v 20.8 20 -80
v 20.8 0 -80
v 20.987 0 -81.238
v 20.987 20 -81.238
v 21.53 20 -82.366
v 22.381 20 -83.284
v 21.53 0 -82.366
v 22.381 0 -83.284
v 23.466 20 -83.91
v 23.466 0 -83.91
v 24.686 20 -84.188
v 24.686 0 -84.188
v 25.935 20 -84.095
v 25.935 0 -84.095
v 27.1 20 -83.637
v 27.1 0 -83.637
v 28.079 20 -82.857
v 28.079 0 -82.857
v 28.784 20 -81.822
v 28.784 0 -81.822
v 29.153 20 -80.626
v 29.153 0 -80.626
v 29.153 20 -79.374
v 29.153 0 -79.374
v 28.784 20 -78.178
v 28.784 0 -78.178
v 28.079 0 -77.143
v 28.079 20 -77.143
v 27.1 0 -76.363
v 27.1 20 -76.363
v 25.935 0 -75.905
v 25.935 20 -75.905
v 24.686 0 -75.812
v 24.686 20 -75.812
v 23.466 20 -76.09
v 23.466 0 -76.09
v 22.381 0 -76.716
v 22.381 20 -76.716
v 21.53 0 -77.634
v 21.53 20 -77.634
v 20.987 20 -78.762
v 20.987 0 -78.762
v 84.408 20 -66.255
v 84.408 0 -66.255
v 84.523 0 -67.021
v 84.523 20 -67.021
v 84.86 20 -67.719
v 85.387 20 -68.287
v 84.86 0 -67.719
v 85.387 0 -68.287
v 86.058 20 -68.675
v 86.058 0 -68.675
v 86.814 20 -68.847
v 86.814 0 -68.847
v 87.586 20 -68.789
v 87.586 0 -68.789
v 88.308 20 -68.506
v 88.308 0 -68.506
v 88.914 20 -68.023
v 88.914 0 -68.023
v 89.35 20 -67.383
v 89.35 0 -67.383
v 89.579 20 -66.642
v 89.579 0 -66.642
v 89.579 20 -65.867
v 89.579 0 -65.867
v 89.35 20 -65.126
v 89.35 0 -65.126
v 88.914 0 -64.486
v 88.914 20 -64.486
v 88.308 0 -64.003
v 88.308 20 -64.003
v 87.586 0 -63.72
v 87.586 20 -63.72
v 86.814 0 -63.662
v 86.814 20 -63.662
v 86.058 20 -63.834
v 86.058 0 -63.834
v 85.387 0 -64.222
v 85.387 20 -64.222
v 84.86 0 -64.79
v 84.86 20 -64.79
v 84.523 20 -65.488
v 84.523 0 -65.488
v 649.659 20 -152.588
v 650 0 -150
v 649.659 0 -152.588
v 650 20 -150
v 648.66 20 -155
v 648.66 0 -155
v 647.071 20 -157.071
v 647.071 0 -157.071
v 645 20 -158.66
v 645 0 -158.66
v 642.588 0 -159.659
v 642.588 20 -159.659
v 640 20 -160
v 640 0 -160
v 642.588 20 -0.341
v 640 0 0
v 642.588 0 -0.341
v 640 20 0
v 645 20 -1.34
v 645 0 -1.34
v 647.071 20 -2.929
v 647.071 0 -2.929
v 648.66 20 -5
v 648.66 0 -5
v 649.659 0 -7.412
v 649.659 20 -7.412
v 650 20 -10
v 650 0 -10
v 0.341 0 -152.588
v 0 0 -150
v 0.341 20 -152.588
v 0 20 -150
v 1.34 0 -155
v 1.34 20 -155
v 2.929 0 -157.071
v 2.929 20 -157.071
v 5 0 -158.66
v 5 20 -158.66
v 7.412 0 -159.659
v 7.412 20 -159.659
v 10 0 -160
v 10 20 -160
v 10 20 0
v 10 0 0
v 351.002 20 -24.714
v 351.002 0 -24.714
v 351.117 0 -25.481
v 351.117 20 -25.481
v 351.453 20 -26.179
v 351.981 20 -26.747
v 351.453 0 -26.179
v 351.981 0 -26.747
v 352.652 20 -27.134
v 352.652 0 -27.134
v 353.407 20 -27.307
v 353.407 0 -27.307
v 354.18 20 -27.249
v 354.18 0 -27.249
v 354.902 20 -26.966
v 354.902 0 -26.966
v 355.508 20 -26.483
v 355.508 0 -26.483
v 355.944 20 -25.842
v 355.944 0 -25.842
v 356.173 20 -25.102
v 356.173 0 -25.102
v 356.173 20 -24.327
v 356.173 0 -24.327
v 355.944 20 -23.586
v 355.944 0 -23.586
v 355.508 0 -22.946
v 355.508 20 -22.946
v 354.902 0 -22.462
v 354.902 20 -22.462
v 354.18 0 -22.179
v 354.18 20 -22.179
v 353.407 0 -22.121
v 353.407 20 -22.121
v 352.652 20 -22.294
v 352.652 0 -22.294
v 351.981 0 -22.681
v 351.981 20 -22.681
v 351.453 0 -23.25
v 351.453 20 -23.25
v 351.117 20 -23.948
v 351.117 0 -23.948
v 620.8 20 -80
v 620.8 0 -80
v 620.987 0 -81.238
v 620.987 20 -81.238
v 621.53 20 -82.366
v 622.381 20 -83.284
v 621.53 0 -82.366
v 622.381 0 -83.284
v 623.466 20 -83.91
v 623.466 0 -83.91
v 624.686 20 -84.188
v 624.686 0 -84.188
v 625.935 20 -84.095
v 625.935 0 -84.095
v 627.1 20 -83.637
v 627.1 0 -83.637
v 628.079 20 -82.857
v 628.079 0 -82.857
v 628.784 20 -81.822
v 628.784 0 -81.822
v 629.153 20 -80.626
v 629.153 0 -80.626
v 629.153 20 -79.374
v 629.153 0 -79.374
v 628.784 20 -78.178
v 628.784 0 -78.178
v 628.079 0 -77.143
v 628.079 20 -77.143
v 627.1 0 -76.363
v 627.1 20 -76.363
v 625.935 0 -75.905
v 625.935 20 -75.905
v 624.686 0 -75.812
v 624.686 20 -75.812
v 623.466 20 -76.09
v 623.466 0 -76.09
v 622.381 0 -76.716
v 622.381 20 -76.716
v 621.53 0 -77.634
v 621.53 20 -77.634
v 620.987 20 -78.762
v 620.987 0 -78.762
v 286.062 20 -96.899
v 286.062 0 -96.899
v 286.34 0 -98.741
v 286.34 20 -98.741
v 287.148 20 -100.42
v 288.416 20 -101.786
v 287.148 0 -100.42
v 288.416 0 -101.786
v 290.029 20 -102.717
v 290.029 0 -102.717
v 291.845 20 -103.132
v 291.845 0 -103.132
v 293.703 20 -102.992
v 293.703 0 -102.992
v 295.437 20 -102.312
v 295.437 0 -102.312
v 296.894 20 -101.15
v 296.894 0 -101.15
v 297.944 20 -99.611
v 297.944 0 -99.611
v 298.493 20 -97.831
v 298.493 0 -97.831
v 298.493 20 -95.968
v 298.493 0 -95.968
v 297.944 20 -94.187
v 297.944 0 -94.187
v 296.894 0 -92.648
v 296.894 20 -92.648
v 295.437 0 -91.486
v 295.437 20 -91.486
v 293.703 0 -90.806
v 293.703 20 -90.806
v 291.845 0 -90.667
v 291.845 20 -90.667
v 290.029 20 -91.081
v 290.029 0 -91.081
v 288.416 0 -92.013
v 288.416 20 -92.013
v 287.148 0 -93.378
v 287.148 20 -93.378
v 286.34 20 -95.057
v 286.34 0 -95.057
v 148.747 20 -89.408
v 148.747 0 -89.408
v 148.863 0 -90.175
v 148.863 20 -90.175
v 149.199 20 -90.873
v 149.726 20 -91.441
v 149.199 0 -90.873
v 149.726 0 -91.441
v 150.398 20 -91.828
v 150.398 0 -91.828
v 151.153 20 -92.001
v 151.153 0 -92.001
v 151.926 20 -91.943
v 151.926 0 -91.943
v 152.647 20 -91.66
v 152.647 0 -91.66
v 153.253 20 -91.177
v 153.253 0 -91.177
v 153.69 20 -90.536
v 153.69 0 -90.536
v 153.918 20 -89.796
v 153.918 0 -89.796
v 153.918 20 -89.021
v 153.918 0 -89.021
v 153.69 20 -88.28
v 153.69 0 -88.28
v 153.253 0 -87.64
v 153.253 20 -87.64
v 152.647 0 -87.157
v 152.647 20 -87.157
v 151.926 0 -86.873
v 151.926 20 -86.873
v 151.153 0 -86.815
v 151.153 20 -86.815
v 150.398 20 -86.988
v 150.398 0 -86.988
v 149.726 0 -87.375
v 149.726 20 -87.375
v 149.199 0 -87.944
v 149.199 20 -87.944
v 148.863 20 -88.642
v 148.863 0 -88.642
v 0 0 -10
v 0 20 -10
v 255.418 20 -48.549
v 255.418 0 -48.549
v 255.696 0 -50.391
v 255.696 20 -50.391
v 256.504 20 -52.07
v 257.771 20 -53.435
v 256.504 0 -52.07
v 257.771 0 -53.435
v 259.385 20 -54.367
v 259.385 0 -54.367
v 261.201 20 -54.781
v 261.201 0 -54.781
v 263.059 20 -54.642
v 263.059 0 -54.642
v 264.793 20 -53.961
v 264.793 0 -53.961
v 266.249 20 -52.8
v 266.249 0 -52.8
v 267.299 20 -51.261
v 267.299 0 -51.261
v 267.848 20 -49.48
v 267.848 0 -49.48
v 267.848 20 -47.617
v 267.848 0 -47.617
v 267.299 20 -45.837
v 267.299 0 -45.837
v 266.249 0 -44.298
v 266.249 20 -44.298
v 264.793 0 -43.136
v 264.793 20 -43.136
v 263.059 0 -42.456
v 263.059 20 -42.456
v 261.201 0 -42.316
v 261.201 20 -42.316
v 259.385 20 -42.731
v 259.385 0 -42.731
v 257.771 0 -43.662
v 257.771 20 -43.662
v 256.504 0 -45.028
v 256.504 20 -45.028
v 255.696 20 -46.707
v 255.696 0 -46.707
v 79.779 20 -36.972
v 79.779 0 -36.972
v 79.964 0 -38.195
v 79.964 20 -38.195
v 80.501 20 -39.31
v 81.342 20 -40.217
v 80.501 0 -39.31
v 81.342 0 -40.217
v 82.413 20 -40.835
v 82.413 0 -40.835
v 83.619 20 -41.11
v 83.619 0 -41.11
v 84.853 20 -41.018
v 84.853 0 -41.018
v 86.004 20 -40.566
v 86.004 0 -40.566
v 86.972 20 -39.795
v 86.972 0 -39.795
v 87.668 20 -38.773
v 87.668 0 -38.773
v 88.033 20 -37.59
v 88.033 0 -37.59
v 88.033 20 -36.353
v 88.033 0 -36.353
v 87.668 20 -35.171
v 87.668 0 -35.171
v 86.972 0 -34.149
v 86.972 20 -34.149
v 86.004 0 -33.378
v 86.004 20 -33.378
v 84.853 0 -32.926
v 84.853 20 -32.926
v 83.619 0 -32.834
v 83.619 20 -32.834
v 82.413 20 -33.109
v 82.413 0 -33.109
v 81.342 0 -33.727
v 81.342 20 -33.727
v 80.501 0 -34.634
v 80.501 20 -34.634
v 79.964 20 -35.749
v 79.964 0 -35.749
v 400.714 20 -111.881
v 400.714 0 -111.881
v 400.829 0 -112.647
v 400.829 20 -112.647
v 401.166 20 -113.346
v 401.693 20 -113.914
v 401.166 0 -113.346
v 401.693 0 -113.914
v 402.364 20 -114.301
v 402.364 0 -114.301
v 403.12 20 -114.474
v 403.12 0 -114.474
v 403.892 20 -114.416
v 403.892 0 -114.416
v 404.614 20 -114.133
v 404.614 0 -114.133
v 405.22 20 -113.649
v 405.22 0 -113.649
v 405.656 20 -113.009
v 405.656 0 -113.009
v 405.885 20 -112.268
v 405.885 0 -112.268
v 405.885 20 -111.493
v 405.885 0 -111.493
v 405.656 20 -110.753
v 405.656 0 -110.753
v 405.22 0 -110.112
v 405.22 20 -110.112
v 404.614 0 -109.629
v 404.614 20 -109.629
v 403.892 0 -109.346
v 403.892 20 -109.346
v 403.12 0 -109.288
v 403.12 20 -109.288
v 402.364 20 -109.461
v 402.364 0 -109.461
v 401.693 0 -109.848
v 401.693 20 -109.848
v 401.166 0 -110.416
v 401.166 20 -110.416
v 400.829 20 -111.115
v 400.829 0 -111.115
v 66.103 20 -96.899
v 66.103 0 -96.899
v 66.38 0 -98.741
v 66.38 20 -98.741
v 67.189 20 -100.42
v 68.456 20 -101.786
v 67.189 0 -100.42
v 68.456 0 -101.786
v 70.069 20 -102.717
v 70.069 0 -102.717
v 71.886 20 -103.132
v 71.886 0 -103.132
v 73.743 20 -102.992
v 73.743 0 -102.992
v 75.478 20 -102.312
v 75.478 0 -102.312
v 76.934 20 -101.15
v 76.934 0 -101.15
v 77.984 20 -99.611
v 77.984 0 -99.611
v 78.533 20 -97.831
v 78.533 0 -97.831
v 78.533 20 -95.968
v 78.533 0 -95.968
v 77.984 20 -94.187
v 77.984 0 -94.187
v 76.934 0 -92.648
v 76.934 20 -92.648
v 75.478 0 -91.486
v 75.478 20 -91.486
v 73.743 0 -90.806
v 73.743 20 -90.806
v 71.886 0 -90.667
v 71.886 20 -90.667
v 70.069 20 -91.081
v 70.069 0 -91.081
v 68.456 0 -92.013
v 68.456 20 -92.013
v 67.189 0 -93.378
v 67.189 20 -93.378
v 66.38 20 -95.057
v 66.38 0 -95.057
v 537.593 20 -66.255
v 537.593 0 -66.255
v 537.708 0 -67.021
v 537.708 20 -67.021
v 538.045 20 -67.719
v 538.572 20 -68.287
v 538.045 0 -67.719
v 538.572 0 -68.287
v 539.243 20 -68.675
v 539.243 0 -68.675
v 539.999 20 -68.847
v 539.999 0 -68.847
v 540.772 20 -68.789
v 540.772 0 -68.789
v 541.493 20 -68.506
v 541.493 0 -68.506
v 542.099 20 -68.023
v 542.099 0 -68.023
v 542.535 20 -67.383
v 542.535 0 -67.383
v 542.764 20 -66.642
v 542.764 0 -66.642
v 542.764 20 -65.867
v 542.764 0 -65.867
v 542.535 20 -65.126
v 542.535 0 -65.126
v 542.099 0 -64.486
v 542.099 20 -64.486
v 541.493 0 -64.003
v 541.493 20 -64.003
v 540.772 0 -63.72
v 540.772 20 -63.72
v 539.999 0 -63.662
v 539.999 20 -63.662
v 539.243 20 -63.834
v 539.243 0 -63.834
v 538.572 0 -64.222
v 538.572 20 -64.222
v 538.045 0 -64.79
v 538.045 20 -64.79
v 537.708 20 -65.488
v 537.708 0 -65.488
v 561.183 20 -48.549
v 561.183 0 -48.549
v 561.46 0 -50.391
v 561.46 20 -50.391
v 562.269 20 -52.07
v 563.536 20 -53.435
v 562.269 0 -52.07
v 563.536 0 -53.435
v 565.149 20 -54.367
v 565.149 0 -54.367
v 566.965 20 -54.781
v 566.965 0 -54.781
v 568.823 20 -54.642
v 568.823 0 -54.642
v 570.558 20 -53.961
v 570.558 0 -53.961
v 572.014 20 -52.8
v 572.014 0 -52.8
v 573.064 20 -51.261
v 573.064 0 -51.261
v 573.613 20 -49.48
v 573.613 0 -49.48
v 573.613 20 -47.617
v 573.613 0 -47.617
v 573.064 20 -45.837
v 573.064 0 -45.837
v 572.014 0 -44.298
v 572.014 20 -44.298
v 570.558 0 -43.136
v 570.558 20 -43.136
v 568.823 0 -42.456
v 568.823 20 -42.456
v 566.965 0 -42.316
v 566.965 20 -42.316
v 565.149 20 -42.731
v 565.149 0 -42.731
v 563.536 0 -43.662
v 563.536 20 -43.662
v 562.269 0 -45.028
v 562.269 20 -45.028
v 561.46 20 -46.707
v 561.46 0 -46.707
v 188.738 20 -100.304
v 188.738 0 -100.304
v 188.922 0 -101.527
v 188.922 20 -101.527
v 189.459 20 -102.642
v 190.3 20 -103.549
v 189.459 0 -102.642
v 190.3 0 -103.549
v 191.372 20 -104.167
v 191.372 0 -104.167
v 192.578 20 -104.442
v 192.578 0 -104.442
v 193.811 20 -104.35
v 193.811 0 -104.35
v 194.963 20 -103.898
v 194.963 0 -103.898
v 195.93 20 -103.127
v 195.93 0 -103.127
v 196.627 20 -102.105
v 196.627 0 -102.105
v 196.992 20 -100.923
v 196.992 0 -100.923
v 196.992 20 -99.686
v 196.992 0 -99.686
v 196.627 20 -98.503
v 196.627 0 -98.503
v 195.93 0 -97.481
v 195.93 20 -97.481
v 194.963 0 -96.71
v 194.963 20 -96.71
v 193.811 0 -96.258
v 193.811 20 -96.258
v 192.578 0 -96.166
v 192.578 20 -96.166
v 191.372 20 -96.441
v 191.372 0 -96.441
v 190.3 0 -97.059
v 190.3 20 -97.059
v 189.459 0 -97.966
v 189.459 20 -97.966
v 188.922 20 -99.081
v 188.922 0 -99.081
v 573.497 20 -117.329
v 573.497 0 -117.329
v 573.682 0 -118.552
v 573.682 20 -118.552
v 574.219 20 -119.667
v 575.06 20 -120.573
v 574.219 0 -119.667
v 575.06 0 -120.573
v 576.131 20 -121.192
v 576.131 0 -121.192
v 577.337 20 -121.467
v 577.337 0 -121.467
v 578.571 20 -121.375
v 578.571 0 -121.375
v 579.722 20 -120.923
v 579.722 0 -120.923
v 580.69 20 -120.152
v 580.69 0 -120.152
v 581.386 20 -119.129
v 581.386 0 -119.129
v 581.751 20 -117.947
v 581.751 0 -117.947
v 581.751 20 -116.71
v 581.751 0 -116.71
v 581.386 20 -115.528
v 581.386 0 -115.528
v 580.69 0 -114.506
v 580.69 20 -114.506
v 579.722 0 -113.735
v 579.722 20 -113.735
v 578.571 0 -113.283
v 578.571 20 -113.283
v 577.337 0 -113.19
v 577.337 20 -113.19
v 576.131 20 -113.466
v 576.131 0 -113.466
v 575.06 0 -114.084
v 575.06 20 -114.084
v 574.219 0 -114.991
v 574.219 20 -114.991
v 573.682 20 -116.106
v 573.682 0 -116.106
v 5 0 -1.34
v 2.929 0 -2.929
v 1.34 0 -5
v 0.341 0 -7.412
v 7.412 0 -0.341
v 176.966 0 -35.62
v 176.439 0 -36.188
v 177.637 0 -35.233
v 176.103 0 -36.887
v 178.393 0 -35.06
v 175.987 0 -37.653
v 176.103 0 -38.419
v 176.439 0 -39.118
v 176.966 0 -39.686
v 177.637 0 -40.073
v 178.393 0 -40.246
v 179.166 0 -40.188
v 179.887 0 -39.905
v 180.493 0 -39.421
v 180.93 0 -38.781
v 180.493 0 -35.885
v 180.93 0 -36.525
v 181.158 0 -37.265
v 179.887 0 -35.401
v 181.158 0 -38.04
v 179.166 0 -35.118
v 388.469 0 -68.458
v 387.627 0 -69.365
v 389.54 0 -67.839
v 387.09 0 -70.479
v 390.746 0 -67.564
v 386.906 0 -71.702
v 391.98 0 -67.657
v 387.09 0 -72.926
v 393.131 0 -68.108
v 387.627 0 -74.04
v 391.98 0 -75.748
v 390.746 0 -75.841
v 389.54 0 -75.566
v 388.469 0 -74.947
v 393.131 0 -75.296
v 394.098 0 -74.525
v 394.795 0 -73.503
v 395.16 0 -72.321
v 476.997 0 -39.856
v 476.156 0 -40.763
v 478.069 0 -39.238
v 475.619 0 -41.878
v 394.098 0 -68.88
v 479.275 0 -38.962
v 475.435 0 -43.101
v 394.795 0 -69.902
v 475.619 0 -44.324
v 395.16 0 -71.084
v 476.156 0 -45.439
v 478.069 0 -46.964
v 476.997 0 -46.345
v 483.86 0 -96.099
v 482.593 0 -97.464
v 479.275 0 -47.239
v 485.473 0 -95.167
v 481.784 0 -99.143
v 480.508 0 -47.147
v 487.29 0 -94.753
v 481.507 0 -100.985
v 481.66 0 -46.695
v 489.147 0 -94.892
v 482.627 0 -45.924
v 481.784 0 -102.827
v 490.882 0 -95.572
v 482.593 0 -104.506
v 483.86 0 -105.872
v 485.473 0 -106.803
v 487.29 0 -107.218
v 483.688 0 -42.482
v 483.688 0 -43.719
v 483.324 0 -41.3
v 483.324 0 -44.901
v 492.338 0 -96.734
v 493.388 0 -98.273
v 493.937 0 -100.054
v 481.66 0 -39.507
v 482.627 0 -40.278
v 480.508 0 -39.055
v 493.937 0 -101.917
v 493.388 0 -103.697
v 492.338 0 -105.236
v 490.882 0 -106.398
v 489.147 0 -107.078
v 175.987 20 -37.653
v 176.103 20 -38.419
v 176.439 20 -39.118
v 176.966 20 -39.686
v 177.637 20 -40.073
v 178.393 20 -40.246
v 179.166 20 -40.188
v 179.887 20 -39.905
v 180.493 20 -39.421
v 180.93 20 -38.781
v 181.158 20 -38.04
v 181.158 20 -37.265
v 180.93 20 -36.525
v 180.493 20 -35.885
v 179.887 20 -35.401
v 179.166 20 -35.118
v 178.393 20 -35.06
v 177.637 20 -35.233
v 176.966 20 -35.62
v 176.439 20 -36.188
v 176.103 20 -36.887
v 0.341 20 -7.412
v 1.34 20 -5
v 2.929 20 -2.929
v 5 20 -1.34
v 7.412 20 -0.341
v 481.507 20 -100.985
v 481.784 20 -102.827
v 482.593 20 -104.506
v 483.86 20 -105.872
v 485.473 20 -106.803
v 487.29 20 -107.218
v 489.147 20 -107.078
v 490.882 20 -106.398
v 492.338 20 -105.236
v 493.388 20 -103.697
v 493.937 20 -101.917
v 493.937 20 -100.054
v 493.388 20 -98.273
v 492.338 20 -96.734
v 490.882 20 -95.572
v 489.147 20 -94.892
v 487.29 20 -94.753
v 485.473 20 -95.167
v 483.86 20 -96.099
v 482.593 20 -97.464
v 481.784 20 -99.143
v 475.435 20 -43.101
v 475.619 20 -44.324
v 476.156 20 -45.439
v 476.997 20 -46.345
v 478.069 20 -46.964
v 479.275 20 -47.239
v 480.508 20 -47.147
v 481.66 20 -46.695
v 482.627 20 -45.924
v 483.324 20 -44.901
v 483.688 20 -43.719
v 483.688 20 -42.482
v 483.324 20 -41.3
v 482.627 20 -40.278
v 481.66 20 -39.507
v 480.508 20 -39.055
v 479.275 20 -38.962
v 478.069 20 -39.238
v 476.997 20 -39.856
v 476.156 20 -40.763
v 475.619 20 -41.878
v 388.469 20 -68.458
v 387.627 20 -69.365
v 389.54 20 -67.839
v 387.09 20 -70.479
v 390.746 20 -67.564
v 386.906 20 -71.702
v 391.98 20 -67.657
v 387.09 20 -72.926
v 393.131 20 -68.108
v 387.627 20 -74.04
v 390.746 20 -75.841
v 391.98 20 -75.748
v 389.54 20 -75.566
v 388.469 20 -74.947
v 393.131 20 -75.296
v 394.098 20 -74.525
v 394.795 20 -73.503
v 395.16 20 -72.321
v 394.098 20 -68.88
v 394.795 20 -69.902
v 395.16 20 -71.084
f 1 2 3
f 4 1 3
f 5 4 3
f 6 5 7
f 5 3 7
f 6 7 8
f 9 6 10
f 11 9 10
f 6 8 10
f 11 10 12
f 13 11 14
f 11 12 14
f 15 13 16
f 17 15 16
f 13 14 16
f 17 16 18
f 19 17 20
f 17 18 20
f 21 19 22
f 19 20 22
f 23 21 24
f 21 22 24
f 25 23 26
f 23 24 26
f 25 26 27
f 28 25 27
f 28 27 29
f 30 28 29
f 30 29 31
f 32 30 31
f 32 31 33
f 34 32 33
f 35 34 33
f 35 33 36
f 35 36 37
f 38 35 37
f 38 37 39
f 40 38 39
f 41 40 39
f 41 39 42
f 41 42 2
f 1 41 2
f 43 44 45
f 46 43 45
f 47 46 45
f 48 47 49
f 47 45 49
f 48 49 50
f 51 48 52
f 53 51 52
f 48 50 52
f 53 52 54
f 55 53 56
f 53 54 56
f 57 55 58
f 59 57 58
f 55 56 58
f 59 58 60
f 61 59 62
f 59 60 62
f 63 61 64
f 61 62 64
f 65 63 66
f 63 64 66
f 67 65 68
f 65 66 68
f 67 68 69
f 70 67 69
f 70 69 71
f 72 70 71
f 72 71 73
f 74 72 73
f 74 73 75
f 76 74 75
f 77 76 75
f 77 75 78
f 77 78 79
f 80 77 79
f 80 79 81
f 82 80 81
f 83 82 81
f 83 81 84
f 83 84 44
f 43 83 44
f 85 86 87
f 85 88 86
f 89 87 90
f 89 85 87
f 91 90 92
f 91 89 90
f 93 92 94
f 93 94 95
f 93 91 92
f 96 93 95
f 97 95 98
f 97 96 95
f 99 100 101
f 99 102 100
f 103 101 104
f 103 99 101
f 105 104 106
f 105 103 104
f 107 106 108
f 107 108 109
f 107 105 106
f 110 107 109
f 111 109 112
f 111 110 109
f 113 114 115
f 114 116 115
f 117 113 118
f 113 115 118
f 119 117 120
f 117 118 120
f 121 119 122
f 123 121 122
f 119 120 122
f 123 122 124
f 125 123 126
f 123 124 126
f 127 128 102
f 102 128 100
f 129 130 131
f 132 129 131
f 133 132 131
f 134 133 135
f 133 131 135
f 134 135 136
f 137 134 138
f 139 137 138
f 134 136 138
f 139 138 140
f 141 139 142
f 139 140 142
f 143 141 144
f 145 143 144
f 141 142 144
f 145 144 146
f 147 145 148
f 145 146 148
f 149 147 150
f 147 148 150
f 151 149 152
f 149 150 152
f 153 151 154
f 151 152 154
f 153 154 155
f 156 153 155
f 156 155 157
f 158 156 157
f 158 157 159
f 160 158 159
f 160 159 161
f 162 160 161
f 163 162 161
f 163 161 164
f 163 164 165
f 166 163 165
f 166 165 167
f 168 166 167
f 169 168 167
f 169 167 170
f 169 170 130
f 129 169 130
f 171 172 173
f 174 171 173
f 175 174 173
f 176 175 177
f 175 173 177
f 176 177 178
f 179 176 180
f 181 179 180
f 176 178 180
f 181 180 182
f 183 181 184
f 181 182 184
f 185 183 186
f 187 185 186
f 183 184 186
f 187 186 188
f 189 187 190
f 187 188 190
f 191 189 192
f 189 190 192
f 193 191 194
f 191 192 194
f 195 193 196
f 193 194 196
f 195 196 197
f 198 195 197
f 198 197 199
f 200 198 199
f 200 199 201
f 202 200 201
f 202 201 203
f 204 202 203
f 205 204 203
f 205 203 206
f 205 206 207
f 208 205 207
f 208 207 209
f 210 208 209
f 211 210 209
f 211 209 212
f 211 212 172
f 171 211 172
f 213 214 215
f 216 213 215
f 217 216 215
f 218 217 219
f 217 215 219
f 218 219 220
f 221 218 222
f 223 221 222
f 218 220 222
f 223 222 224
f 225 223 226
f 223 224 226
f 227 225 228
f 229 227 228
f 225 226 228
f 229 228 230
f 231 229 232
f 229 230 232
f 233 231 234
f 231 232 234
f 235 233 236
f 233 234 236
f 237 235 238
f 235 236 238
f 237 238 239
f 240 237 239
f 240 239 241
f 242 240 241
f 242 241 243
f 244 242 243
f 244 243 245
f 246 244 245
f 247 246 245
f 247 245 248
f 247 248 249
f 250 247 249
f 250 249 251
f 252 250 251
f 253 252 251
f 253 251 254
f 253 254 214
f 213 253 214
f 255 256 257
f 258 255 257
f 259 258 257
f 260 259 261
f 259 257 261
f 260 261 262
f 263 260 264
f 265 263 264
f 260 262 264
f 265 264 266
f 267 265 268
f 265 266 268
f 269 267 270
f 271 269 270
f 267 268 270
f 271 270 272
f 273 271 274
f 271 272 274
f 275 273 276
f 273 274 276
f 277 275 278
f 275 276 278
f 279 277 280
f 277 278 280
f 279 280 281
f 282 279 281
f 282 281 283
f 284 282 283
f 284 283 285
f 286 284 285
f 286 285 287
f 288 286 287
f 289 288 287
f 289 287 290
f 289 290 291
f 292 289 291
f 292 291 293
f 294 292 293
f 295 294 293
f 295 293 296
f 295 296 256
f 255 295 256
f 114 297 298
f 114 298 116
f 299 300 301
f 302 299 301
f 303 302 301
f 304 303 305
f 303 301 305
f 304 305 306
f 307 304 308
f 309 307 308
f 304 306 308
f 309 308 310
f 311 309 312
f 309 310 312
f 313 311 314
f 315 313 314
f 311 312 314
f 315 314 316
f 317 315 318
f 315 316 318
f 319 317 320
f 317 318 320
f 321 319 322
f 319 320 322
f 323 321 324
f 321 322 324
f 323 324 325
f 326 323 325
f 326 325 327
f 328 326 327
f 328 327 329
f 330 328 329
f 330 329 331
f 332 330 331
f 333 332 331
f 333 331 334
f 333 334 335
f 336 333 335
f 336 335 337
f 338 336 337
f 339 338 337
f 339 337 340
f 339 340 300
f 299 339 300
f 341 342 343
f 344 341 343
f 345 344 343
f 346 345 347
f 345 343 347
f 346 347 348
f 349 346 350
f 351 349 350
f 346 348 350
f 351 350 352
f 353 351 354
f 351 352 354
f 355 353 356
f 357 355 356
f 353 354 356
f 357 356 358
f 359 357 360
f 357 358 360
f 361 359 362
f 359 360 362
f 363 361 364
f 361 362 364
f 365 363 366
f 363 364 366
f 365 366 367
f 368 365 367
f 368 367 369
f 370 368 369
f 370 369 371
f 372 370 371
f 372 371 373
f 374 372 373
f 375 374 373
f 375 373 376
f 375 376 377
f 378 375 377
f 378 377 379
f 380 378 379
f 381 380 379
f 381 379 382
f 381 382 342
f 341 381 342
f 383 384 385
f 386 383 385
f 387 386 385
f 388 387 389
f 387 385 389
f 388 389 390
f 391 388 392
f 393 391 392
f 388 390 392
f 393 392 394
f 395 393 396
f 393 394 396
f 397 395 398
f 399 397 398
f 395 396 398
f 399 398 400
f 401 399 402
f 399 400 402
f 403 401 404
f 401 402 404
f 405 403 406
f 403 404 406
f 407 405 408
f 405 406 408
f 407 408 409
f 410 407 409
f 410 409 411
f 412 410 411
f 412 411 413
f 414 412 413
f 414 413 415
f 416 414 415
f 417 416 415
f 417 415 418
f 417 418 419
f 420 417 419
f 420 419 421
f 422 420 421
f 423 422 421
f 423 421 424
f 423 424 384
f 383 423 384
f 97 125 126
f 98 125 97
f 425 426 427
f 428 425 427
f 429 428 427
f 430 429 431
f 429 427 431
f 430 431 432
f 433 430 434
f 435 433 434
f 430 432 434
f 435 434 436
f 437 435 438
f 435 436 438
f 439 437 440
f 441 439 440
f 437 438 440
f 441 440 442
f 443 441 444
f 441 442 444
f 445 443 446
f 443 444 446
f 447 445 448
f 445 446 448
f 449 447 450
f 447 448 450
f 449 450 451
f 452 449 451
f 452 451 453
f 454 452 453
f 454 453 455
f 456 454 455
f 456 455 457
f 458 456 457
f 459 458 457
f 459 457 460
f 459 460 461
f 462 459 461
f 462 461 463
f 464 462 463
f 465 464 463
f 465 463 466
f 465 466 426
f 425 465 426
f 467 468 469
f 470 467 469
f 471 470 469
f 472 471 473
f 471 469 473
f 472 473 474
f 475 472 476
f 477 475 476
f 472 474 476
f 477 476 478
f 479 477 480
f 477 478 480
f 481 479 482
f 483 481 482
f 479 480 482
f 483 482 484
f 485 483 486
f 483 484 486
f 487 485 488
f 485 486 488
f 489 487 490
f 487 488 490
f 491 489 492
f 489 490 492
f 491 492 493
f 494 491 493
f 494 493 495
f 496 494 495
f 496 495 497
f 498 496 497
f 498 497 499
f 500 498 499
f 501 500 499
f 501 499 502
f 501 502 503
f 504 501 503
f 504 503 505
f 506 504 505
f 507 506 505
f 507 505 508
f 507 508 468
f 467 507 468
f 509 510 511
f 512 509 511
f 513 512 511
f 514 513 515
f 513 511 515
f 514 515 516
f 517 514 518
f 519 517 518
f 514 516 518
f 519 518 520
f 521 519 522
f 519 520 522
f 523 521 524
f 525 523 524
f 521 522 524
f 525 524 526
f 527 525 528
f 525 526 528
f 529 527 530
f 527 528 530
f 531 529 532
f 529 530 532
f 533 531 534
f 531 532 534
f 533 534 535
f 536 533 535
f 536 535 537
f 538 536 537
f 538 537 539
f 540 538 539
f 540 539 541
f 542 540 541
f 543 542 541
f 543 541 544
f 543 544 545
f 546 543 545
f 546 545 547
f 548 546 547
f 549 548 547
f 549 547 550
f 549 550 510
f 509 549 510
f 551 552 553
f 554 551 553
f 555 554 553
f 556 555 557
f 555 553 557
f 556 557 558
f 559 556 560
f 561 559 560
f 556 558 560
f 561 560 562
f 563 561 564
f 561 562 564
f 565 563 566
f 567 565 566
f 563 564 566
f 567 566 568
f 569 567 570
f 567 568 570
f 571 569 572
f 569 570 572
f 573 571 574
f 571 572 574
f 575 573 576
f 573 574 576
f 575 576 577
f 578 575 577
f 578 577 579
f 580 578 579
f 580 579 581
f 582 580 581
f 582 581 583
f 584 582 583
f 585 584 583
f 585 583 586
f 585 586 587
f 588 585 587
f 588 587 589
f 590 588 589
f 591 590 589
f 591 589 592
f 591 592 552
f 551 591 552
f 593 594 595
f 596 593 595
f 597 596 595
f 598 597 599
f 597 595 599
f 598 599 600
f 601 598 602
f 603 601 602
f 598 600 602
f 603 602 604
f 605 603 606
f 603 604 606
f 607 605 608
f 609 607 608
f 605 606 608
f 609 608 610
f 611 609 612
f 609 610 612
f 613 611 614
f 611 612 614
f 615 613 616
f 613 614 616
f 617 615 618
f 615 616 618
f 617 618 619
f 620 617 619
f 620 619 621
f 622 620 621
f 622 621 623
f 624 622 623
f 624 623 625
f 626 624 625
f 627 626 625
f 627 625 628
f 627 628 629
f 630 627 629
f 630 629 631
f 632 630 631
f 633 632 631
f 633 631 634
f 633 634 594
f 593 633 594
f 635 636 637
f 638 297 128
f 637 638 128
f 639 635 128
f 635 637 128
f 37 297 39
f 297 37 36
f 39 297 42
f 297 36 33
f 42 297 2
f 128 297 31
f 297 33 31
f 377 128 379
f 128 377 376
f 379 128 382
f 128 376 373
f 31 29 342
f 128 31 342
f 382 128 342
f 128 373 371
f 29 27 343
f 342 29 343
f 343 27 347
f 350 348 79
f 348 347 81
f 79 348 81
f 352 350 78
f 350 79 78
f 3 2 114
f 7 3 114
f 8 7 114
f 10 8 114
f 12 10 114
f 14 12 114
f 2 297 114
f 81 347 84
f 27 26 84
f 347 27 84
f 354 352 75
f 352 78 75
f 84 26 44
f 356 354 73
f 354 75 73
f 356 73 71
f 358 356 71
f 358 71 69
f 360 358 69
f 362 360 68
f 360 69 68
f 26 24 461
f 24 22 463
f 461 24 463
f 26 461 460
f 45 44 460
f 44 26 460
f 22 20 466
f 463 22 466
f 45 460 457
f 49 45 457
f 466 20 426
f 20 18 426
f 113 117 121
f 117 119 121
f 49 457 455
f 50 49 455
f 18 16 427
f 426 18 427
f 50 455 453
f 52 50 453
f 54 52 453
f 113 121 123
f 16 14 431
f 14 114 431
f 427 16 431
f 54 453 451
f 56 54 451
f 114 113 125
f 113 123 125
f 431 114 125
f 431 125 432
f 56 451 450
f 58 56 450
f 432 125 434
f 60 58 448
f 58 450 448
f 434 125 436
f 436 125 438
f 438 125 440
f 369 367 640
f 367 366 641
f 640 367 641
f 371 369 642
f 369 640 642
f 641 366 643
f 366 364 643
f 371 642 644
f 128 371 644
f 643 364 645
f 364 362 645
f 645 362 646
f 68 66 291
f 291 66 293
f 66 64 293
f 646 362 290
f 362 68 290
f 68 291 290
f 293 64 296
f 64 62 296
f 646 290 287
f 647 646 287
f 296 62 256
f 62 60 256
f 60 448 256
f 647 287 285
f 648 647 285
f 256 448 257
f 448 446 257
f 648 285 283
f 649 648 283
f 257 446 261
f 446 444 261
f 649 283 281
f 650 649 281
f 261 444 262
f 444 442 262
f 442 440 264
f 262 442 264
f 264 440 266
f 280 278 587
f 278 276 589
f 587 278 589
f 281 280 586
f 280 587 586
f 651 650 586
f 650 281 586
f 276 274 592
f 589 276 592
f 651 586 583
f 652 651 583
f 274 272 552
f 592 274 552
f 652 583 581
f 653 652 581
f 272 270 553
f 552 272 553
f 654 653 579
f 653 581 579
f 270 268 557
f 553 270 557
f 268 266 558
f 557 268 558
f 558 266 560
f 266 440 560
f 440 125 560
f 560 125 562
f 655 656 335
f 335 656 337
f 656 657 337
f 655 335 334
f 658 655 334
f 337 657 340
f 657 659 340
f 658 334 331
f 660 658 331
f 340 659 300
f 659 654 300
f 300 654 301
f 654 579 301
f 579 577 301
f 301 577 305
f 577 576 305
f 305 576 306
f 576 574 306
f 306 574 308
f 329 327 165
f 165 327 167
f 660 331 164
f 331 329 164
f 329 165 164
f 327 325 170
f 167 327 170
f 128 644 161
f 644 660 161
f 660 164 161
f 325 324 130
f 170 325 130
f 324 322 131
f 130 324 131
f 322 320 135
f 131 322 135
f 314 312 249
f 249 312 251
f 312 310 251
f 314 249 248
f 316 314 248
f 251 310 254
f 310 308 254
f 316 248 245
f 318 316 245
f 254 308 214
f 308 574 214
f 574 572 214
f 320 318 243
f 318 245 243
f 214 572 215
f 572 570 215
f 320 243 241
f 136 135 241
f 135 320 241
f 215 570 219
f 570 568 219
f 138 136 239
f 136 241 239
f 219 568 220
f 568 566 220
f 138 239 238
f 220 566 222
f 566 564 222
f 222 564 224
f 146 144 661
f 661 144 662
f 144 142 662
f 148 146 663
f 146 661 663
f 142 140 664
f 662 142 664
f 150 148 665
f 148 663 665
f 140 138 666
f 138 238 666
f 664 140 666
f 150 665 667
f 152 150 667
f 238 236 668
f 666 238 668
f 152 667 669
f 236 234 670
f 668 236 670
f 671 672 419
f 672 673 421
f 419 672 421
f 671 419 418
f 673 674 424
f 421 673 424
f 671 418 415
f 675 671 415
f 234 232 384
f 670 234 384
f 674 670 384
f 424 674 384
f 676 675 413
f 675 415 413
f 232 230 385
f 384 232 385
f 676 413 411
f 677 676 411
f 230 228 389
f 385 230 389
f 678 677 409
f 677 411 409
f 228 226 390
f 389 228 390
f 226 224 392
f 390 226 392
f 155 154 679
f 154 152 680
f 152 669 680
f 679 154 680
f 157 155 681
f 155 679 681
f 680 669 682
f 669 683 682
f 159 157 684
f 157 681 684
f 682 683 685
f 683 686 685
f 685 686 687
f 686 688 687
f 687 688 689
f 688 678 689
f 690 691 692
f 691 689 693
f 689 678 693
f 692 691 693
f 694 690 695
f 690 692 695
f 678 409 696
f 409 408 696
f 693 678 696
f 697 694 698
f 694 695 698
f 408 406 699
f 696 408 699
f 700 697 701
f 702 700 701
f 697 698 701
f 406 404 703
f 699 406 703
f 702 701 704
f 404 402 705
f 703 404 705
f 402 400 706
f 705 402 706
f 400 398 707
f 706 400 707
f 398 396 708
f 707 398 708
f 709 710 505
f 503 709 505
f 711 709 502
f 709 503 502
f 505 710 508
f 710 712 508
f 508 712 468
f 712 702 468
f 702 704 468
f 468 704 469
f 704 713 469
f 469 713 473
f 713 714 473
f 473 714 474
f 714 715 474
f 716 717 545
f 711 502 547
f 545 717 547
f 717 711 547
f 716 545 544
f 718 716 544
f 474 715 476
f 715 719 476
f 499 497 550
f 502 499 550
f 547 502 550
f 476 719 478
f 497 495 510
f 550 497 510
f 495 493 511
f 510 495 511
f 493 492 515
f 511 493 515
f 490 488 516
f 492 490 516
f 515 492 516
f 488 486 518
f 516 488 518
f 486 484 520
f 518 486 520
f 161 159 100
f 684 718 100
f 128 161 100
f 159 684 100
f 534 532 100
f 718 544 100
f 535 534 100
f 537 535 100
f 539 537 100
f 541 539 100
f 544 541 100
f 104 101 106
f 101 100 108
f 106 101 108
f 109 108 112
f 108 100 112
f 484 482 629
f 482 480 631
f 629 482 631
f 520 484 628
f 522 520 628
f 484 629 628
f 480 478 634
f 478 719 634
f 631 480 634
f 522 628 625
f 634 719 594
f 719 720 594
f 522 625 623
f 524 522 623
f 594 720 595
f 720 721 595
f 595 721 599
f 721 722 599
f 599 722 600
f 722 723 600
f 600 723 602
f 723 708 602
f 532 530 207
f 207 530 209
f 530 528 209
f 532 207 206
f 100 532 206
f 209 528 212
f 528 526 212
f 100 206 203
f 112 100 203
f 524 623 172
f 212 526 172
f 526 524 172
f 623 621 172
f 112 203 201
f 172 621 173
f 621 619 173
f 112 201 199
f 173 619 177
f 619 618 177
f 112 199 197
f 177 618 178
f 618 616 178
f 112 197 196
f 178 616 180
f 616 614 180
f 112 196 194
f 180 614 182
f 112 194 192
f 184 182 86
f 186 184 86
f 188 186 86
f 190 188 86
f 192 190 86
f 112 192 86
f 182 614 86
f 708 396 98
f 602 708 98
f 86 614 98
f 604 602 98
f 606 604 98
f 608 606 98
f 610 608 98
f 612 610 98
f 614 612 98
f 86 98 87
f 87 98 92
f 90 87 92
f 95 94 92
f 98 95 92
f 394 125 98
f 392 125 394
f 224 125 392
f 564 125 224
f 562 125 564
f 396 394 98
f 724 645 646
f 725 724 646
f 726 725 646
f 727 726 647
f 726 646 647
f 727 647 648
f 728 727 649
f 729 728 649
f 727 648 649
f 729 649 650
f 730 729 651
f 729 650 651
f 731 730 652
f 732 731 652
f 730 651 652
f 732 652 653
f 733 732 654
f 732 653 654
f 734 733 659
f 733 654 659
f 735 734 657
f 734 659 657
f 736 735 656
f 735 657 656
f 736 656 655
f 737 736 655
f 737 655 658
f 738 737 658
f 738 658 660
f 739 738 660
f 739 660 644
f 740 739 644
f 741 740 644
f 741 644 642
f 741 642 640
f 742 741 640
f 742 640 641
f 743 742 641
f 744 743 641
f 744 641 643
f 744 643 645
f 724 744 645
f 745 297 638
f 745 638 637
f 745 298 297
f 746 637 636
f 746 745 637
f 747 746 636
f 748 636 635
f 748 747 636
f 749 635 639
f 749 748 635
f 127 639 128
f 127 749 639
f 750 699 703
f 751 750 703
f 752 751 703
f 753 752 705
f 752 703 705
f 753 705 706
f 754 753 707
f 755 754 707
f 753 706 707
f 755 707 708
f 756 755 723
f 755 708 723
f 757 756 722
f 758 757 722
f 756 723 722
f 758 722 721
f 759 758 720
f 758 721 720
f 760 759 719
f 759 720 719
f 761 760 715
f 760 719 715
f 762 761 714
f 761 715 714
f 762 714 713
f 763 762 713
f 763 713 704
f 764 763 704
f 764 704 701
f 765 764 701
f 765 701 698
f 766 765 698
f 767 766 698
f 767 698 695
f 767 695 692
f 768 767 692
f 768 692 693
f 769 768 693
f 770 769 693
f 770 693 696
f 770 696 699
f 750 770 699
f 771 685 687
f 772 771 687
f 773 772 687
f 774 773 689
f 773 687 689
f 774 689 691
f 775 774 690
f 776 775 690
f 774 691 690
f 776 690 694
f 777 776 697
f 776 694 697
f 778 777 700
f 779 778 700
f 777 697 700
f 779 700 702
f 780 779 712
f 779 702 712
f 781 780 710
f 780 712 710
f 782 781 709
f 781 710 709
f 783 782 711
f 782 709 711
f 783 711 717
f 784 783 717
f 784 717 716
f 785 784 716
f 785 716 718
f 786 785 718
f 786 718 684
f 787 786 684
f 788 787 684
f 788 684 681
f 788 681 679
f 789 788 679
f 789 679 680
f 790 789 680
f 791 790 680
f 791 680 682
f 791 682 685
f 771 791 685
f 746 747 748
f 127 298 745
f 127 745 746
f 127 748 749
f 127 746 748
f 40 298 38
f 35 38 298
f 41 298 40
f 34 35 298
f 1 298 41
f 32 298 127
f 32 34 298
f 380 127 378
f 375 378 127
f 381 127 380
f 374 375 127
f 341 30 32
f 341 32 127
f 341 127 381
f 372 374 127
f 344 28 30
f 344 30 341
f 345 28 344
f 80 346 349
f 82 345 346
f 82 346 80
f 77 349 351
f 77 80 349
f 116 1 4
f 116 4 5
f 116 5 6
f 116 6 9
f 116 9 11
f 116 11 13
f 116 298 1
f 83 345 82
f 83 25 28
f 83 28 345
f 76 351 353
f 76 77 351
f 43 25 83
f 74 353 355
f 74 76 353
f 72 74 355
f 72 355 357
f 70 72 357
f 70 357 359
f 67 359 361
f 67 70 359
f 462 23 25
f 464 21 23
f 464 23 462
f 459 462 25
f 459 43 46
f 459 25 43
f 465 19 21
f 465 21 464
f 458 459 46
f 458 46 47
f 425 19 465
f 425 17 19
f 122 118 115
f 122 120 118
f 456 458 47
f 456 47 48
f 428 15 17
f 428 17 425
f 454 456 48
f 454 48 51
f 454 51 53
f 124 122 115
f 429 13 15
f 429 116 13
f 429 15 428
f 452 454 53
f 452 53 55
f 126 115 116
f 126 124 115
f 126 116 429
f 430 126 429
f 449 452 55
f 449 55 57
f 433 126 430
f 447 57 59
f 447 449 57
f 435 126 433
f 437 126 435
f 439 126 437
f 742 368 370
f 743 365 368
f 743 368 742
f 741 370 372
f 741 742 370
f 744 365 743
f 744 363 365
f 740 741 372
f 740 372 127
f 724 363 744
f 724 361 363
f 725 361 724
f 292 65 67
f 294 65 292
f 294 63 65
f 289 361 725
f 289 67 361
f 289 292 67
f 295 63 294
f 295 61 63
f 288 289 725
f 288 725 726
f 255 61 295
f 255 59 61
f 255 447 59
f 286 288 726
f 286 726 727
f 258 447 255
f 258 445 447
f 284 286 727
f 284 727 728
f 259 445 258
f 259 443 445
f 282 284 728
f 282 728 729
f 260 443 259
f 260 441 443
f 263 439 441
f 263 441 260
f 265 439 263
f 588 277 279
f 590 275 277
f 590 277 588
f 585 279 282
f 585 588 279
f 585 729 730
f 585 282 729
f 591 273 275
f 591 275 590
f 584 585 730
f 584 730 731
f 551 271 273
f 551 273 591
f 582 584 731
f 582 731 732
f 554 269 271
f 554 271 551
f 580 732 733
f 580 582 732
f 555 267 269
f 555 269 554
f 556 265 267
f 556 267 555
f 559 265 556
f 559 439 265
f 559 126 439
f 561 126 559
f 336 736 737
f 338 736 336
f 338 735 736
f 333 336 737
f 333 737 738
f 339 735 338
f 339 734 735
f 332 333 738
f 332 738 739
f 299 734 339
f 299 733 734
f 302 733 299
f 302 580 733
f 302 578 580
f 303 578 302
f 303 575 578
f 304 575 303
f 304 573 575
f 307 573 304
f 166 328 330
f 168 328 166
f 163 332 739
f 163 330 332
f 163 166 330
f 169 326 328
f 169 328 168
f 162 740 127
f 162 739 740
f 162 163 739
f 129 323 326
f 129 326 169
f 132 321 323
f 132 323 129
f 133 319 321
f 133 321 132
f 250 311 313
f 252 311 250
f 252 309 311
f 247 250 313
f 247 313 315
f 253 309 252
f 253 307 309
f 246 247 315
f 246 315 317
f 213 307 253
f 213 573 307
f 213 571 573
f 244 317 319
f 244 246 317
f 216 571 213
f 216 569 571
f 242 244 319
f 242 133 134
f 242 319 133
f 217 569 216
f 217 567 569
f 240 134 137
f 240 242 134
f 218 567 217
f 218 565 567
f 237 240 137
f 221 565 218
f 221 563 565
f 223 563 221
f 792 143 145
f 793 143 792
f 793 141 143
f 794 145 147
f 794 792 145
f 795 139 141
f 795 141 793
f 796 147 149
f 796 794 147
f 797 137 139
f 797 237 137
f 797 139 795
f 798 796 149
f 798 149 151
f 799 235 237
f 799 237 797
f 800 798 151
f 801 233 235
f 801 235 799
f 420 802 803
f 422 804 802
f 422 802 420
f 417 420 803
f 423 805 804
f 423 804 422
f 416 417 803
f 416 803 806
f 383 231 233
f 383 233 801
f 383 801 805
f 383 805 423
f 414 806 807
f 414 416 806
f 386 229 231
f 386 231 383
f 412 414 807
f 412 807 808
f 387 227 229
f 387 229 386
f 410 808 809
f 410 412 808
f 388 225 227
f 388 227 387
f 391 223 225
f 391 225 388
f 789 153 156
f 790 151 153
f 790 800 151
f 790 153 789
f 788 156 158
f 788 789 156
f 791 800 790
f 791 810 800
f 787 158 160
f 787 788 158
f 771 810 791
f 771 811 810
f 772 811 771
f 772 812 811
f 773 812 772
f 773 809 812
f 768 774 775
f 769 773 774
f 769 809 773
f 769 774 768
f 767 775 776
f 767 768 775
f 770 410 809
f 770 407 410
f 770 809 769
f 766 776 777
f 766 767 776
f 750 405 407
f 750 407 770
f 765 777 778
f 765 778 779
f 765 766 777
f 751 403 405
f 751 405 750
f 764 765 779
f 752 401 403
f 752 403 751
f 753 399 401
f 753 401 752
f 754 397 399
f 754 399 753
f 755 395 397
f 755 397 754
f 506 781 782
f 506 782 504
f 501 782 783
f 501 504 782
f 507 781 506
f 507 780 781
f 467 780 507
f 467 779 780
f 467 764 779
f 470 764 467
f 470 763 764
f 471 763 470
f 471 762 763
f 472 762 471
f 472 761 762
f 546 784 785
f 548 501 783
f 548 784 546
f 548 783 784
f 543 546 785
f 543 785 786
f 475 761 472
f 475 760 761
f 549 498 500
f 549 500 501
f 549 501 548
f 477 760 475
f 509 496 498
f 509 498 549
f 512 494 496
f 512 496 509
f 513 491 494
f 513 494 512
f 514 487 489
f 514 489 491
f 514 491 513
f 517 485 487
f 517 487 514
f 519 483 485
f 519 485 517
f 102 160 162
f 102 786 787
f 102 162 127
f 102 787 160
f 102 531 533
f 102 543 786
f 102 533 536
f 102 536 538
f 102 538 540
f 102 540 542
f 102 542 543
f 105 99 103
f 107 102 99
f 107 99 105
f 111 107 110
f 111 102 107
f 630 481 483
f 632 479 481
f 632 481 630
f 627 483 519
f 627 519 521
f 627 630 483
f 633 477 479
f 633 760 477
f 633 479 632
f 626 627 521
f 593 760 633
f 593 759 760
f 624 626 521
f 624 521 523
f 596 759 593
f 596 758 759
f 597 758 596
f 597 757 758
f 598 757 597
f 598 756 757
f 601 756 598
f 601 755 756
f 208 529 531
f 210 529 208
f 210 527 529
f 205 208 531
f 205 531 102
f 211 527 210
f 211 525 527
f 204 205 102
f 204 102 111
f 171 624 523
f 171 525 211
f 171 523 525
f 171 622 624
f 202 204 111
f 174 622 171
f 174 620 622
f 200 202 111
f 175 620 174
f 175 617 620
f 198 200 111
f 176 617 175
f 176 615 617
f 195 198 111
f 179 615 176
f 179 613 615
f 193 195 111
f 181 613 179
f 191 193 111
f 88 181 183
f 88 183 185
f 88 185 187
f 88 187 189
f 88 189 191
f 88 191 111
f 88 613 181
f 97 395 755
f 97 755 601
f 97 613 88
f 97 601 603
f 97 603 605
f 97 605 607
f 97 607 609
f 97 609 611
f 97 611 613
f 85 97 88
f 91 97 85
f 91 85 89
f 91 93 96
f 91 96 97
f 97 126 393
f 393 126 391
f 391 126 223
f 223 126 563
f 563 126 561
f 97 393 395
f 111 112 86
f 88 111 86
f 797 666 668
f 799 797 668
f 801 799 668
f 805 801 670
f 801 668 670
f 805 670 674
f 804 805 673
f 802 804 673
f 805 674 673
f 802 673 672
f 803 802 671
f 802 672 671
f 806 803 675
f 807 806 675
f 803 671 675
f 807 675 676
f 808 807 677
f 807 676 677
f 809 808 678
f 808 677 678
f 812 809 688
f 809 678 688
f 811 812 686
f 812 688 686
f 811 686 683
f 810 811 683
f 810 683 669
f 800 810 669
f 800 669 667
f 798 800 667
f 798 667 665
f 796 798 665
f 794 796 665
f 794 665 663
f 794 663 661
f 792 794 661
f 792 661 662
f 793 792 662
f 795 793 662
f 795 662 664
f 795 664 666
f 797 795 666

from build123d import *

# Parameters (mm, degrees)
SKETCH1_W                    = 650
SKETCH1_H                    = 160
BOSS_EXTRUDE1_DEPTH          = 20
FILLET1_R                    = 10
F_12_5_12_5_DIAMETER_HOLE1_D = 12.5
F_8_3_8_3_DIAMETER_HOLE1_D   = 8.3
F_5_2_5_2_DIAMETER_HOLE1_D   = 5.2
M8_CLEARANCE_HOLE1_D         = 8.4


with BuildPart() as part:
    # Sketch1 → Boss-Extrude1 (new body)
    with BuildSketch(Plane(origin=(0, 0, 0), x_dir=(1, 0, 0), z_dir=(0, 1, 0))):
        with Locations((325, 80)):
            Rectangle(SKETCH1_W, SKETCH1_H)
    extrude(amount=BOSS_EXTRUDE1_DEPTH)

    # Fillet1
    fillet1_edges = [part.edges().sort_by_distance(p)[0] for p in [
        (0, 10, 0),
        (650, 10, 0),
        (650, 10, -160),
        (0, 10, -160),
    ]]
    fillet(fillet1_edges, radius=FILLET1_R)

    # Ø12.5 (12.5) Diameter Hole1 (through all)
    with Locations(Plane(origin=(0, 20, 0), x_dir=(1, 0, 0), z_dir=(0, 1, 0))):
        with Locations((72.352582635, 96.89911856), (261.667898073, 48.548804186), (487.756692049, 100.98506062), (567.432562216, 48.548804186), (292.312463521, 96.89911856)):
            Hole(F_12_5_12_5_DIAMETER_HOLE1_D / 2)

    # Ø8.3 (8.3) Diameter Hole1 (through all)
    with Locations(Plane(origin=(0, 20, 0), x_dir=(1, 0, 0), z_dir=(0, 1, 0))):
        with Locations((192.887873399, 100.304070277), (83.929418471, 36.97196835), (391.0560633, 71.702475858), (577.647417365, 117.32882886), (479.58480793, 43.10088144)):
            Hole(F_8_3_8_3_DIAMETER_HOLE1_D / 2)

    # Ø5.2 (5.2) Diameter Hole1 (through all)
    with Locations(Plane(origin=(0, 20, 0), x_dir=(1, 0, 0), z_dir=(0, 1, 0))):
        with Locations((178.58707619, 37.652958693), (151.347462458, 89.408224784), (353.601594419, 24.71414217), (403.31388948, 111.880906113), (540.192948484, 66.254553112), (87.007836042, 66.254553112)):
            Hole(F_5_2_5_2_DIAMETER_HOLE1_D / 2)

    # M8 Clearance Hole1 (through all)
    with Locations(Plane(origin=(0, 20, 0), x_dir=(1, 0, 0), z_dir=(0, 1, 0))):
        with Locations((625, 80), (25, 80)):
            Hole(M8_CLEARANCE_HOLE1_D / 2)


solid = part.part
